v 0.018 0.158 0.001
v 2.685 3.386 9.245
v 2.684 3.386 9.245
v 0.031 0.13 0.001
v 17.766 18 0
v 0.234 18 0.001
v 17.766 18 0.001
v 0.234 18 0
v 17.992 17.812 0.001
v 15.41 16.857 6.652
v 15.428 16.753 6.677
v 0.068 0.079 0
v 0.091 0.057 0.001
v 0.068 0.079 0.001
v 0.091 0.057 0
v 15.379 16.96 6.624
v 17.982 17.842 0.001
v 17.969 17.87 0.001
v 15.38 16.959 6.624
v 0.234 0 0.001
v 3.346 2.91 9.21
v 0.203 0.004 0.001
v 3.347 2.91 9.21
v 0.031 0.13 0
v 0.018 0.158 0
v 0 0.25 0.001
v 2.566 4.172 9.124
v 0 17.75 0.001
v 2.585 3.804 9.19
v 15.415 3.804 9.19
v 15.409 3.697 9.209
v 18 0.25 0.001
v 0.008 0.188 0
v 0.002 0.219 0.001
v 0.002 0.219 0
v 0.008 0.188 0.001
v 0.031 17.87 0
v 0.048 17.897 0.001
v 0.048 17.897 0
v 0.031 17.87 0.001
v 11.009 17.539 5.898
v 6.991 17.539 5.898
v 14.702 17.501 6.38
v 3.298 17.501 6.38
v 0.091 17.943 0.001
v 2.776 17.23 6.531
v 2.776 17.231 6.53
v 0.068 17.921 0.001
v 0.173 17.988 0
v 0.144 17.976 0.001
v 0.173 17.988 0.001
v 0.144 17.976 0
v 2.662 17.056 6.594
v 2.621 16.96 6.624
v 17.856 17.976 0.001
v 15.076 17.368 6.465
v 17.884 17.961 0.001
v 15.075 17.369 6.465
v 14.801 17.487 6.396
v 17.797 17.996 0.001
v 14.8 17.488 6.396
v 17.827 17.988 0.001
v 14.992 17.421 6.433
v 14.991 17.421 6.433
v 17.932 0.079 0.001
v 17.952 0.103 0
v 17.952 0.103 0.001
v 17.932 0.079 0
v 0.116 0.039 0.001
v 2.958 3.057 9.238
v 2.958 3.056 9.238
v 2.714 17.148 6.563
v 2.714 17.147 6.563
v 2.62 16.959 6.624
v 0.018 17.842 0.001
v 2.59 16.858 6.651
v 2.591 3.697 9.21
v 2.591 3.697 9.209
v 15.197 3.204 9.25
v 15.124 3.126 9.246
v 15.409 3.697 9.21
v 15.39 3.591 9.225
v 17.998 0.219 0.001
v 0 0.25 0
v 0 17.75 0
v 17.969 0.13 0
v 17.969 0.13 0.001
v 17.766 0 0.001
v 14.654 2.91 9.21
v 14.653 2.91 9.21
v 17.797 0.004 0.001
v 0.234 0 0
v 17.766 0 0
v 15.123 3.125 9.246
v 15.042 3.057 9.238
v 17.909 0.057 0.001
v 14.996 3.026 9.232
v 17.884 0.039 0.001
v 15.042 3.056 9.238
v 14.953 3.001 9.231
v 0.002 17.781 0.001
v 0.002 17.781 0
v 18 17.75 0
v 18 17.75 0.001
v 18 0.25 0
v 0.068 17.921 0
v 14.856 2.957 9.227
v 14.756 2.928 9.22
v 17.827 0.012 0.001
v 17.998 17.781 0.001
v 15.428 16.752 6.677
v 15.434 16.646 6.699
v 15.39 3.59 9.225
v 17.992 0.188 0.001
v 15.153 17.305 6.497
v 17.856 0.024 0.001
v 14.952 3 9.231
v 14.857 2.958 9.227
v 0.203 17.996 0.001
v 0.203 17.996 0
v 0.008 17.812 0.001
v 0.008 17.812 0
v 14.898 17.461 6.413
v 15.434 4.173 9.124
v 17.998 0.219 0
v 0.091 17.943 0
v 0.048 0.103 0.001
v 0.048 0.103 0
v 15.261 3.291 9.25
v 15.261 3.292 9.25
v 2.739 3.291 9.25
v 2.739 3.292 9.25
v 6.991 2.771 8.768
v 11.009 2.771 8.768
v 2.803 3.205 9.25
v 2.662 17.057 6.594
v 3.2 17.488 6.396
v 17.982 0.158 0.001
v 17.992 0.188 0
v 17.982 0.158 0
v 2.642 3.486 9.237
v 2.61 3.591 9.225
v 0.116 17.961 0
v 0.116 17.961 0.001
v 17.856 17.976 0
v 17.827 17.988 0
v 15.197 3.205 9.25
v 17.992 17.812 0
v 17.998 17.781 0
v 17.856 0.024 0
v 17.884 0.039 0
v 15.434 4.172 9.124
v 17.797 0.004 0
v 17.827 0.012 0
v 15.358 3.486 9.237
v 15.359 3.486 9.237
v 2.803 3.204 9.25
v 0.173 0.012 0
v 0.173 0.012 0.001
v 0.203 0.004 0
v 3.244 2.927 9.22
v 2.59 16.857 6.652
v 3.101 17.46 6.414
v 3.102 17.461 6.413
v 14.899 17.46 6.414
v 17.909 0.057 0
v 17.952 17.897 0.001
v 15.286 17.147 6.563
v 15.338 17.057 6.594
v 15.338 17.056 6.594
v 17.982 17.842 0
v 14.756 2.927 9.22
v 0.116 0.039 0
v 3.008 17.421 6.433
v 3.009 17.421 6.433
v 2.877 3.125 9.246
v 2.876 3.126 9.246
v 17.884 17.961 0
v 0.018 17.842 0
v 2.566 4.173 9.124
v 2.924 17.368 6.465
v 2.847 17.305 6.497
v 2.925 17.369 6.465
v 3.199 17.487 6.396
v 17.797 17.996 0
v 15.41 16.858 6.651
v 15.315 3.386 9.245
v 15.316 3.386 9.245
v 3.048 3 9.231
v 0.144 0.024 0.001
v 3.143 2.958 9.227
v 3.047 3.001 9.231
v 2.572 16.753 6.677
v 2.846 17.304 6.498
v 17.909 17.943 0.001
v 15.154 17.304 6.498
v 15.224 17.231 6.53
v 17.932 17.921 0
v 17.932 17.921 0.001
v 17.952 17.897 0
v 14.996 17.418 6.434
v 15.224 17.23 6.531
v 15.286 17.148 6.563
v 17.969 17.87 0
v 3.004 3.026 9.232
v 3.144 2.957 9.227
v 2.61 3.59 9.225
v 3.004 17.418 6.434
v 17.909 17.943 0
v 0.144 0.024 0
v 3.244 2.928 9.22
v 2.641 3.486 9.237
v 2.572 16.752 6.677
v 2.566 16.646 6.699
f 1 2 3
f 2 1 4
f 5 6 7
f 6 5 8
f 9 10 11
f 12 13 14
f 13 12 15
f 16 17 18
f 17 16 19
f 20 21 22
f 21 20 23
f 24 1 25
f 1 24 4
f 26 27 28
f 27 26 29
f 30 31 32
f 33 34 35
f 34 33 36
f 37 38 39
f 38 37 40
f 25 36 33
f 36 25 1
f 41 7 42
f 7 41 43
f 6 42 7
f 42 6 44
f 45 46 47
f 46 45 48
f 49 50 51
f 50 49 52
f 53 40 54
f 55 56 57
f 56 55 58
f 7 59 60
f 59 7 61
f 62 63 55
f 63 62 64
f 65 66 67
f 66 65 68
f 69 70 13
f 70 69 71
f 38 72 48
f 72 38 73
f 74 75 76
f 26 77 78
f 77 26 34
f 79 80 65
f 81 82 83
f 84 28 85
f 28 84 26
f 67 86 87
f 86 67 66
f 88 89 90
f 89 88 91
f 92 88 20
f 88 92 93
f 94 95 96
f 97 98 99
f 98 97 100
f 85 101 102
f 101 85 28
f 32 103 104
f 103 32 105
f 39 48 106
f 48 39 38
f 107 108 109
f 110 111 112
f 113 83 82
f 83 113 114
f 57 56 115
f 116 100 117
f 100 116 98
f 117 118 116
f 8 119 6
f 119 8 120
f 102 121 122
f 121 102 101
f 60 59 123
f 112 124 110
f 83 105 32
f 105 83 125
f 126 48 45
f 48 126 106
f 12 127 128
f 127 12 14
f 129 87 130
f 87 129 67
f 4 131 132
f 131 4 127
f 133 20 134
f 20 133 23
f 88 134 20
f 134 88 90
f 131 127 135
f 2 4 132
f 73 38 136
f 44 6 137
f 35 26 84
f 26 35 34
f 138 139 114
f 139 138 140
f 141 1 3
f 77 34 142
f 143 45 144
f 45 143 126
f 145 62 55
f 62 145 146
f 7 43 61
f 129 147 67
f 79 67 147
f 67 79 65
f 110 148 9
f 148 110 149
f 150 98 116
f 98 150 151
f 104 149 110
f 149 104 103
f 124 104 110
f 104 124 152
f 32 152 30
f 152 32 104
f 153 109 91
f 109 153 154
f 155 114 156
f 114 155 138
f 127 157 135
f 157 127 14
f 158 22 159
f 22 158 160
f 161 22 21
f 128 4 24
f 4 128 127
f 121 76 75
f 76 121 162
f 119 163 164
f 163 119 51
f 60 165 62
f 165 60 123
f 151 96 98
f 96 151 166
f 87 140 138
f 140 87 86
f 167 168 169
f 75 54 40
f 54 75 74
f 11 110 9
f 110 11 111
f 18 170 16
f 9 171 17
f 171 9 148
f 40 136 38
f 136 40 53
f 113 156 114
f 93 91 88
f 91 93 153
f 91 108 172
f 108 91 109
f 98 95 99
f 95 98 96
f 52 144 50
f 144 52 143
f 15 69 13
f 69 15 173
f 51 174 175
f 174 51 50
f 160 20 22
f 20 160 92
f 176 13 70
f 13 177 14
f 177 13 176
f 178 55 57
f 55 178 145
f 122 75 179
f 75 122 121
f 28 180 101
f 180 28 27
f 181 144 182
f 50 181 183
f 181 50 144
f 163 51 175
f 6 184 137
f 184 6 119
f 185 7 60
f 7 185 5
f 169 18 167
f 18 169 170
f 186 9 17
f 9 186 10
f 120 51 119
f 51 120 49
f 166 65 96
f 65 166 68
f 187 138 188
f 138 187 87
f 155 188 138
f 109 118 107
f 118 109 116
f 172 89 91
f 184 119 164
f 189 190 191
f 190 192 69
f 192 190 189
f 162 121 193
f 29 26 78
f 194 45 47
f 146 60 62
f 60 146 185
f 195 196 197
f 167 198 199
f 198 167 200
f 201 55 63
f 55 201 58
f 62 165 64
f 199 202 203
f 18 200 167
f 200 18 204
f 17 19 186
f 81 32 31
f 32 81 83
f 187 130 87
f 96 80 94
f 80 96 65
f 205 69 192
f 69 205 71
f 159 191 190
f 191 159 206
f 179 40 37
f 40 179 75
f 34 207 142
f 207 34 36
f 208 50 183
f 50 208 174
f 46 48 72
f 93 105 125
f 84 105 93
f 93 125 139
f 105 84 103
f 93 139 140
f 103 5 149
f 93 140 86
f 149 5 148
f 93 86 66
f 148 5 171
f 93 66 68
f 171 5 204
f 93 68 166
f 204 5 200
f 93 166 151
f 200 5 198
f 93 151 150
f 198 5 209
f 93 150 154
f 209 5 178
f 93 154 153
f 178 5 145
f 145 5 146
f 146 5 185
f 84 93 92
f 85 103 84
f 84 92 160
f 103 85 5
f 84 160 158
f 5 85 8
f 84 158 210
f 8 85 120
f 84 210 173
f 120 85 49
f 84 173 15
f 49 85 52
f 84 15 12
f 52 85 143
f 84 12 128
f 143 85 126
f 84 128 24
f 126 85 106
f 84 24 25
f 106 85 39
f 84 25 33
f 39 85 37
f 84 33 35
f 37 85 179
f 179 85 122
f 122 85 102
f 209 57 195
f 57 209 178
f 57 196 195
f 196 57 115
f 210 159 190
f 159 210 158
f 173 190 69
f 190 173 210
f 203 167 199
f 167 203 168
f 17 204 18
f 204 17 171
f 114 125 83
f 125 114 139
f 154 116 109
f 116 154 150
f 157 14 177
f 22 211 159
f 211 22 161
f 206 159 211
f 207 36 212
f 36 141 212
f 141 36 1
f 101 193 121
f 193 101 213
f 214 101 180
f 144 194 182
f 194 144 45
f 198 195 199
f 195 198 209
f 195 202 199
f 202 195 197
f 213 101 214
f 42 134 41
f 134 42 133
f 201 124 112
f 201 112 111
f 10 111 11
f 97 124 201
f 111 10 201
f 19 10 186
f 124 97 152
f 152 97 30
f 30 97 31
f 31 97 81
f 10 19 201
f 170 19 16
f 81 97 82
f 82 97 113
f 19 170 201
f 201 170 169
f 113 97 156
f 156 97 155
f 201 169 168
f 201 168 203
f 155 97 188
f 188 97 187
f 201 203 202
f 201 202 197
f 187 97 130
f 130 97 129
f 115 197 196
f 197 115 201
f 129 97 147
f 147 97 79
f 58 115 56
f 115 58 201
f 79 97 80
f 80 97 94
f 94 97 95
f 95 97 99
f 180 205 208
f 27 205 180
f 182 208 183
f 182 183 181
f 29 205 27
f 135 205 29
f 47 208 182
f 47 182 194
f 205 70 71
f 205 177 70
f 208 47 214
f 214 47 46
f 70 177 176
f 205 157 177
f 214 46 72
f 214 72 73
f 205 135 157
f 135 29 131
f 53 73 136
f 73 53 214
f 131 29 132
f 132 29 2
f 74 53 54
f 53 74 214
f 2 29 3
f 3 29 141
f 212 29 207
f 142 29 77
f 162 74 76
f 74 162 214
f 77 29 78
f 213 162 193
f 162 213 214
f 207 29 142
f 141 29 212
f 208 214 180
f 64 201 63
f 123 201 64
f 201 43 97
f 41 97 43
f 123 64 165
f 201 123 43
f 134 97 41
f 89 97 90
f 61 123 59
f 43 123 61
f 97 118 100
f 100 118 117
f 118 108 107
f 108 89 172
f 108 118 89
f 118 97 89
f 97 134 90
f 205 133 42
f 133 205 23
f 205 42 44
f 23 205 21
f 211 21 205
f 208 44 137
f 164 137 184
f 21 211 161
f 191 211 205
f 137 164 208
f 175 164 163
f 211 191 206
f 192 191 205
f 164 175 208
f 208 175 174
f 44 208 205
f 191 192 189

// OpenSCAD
$fn = 50;

// thickness of the lofts used
LOFT_THICKNESS = 0.001; // this level of detail is indiscernable to a 3d printer

X_AXIS = [1,0,0];

// Generate a square plane with rounded edges
module round_square(corner_r, hor_len, ver_len) {

    hull() {
        translate([corner_r, corner_r, 0]) {
            cylinder(h = LOFT_THICKNESS, r = corner_r);
            translate([0, ver_len - corner_r * 2, 0]) {
                cylinder(h = LOFT_THICKNESS, r = corner_r);
            }

            translate([hor_len - corner_r * 2, 0, 0]) {
                cylinder(h = LOFT_THICKNESS, r = corner_r);
                translate([0, ver_len - corner_r * 2, 0]) {
                    cylinder(h = LOFT_THICKNESS, r = corner_r);
                }
            }
        }
    }

}

//           backside offset: 0.25
//           topside offset: 2.625
//           top vertical length: 14.75
//           top horizontal length: 12.75
//           top face vertical offset: 3
//           scuplt angle: 11 degrees
//           sculpt curve cup radius: 64/2 = 32


// measurements in mm

// ROW 4

// cap profile measurements
cap_height = 9.5;
base_side_len = 18;

// fillet radiuses
base_r = 0.25; // radius of base face
top_r = 0.875;

// top face dimensions
top_hor_len = 12.75;
top_ver_len = 14.75;

// top face positioning
top_hor_margin = (base_side_len - top_hor_len) / 2; // side margins
// should be 2.625 using stock values 
top_ver_margin = 3; // top margin of top face

// cap scuplt
cap_sculpt_angle = 11;
cap_sculpt_tilt = -1; // 1 for positive tilt, -1 for negative tilt
cap_indent = 0.75;

// cap cutout
cutout_len = top_ver_len + 0.75;
cutout_r = 32;

difference() {
    hull() {
        // base face of cap
        round_square(base_r, base_side_len, base_side_len);
        
        // top face of cap
        translate([top_hor_margin, top_ver_margin, cap_height]) {
            // round_square(top_r, top_hor_len, top_ver_len);
            rotate(a = cap_sculpt_tilt * cap_sculpt_angle, v = X_AXIS) {
                round_square(top_r, top_hor_len, top_ver_len);
            }
        }
    }
    
    // cup cutout
    translate([base_side_len / 2,
              top_ver_margin + top_ver_len,
              cap_height - sin(cap_sculpt_angle) * cutout_len - cap_indent]) {
        rotate(a = cap_sculpt_tilt * cap_sculpt_angle, v = X_AXIS) {
            translate([0, 0, cutout_r]) {
                rotate(a = 90, v = X_AXIS) {
                    cylinder(h = cutout_len, r = cutout_r);
                }
            }
        }
    }
}
// keycap side length: 18

// hull() {
//     // base face of cap
//     round_square(base_r, base_side_len, base_side_len);
//     
//     // top face of cap
//     translate([top_hor_margin, top_ver_margin, cap_height]) {
//         rotate(a = cap_sculpt_tilt * cap_sculpt_angle, v = X_AXIS) {
//             round_square(top_r, top_hor_len, top_ver_len);
//         }
//     }
// }
